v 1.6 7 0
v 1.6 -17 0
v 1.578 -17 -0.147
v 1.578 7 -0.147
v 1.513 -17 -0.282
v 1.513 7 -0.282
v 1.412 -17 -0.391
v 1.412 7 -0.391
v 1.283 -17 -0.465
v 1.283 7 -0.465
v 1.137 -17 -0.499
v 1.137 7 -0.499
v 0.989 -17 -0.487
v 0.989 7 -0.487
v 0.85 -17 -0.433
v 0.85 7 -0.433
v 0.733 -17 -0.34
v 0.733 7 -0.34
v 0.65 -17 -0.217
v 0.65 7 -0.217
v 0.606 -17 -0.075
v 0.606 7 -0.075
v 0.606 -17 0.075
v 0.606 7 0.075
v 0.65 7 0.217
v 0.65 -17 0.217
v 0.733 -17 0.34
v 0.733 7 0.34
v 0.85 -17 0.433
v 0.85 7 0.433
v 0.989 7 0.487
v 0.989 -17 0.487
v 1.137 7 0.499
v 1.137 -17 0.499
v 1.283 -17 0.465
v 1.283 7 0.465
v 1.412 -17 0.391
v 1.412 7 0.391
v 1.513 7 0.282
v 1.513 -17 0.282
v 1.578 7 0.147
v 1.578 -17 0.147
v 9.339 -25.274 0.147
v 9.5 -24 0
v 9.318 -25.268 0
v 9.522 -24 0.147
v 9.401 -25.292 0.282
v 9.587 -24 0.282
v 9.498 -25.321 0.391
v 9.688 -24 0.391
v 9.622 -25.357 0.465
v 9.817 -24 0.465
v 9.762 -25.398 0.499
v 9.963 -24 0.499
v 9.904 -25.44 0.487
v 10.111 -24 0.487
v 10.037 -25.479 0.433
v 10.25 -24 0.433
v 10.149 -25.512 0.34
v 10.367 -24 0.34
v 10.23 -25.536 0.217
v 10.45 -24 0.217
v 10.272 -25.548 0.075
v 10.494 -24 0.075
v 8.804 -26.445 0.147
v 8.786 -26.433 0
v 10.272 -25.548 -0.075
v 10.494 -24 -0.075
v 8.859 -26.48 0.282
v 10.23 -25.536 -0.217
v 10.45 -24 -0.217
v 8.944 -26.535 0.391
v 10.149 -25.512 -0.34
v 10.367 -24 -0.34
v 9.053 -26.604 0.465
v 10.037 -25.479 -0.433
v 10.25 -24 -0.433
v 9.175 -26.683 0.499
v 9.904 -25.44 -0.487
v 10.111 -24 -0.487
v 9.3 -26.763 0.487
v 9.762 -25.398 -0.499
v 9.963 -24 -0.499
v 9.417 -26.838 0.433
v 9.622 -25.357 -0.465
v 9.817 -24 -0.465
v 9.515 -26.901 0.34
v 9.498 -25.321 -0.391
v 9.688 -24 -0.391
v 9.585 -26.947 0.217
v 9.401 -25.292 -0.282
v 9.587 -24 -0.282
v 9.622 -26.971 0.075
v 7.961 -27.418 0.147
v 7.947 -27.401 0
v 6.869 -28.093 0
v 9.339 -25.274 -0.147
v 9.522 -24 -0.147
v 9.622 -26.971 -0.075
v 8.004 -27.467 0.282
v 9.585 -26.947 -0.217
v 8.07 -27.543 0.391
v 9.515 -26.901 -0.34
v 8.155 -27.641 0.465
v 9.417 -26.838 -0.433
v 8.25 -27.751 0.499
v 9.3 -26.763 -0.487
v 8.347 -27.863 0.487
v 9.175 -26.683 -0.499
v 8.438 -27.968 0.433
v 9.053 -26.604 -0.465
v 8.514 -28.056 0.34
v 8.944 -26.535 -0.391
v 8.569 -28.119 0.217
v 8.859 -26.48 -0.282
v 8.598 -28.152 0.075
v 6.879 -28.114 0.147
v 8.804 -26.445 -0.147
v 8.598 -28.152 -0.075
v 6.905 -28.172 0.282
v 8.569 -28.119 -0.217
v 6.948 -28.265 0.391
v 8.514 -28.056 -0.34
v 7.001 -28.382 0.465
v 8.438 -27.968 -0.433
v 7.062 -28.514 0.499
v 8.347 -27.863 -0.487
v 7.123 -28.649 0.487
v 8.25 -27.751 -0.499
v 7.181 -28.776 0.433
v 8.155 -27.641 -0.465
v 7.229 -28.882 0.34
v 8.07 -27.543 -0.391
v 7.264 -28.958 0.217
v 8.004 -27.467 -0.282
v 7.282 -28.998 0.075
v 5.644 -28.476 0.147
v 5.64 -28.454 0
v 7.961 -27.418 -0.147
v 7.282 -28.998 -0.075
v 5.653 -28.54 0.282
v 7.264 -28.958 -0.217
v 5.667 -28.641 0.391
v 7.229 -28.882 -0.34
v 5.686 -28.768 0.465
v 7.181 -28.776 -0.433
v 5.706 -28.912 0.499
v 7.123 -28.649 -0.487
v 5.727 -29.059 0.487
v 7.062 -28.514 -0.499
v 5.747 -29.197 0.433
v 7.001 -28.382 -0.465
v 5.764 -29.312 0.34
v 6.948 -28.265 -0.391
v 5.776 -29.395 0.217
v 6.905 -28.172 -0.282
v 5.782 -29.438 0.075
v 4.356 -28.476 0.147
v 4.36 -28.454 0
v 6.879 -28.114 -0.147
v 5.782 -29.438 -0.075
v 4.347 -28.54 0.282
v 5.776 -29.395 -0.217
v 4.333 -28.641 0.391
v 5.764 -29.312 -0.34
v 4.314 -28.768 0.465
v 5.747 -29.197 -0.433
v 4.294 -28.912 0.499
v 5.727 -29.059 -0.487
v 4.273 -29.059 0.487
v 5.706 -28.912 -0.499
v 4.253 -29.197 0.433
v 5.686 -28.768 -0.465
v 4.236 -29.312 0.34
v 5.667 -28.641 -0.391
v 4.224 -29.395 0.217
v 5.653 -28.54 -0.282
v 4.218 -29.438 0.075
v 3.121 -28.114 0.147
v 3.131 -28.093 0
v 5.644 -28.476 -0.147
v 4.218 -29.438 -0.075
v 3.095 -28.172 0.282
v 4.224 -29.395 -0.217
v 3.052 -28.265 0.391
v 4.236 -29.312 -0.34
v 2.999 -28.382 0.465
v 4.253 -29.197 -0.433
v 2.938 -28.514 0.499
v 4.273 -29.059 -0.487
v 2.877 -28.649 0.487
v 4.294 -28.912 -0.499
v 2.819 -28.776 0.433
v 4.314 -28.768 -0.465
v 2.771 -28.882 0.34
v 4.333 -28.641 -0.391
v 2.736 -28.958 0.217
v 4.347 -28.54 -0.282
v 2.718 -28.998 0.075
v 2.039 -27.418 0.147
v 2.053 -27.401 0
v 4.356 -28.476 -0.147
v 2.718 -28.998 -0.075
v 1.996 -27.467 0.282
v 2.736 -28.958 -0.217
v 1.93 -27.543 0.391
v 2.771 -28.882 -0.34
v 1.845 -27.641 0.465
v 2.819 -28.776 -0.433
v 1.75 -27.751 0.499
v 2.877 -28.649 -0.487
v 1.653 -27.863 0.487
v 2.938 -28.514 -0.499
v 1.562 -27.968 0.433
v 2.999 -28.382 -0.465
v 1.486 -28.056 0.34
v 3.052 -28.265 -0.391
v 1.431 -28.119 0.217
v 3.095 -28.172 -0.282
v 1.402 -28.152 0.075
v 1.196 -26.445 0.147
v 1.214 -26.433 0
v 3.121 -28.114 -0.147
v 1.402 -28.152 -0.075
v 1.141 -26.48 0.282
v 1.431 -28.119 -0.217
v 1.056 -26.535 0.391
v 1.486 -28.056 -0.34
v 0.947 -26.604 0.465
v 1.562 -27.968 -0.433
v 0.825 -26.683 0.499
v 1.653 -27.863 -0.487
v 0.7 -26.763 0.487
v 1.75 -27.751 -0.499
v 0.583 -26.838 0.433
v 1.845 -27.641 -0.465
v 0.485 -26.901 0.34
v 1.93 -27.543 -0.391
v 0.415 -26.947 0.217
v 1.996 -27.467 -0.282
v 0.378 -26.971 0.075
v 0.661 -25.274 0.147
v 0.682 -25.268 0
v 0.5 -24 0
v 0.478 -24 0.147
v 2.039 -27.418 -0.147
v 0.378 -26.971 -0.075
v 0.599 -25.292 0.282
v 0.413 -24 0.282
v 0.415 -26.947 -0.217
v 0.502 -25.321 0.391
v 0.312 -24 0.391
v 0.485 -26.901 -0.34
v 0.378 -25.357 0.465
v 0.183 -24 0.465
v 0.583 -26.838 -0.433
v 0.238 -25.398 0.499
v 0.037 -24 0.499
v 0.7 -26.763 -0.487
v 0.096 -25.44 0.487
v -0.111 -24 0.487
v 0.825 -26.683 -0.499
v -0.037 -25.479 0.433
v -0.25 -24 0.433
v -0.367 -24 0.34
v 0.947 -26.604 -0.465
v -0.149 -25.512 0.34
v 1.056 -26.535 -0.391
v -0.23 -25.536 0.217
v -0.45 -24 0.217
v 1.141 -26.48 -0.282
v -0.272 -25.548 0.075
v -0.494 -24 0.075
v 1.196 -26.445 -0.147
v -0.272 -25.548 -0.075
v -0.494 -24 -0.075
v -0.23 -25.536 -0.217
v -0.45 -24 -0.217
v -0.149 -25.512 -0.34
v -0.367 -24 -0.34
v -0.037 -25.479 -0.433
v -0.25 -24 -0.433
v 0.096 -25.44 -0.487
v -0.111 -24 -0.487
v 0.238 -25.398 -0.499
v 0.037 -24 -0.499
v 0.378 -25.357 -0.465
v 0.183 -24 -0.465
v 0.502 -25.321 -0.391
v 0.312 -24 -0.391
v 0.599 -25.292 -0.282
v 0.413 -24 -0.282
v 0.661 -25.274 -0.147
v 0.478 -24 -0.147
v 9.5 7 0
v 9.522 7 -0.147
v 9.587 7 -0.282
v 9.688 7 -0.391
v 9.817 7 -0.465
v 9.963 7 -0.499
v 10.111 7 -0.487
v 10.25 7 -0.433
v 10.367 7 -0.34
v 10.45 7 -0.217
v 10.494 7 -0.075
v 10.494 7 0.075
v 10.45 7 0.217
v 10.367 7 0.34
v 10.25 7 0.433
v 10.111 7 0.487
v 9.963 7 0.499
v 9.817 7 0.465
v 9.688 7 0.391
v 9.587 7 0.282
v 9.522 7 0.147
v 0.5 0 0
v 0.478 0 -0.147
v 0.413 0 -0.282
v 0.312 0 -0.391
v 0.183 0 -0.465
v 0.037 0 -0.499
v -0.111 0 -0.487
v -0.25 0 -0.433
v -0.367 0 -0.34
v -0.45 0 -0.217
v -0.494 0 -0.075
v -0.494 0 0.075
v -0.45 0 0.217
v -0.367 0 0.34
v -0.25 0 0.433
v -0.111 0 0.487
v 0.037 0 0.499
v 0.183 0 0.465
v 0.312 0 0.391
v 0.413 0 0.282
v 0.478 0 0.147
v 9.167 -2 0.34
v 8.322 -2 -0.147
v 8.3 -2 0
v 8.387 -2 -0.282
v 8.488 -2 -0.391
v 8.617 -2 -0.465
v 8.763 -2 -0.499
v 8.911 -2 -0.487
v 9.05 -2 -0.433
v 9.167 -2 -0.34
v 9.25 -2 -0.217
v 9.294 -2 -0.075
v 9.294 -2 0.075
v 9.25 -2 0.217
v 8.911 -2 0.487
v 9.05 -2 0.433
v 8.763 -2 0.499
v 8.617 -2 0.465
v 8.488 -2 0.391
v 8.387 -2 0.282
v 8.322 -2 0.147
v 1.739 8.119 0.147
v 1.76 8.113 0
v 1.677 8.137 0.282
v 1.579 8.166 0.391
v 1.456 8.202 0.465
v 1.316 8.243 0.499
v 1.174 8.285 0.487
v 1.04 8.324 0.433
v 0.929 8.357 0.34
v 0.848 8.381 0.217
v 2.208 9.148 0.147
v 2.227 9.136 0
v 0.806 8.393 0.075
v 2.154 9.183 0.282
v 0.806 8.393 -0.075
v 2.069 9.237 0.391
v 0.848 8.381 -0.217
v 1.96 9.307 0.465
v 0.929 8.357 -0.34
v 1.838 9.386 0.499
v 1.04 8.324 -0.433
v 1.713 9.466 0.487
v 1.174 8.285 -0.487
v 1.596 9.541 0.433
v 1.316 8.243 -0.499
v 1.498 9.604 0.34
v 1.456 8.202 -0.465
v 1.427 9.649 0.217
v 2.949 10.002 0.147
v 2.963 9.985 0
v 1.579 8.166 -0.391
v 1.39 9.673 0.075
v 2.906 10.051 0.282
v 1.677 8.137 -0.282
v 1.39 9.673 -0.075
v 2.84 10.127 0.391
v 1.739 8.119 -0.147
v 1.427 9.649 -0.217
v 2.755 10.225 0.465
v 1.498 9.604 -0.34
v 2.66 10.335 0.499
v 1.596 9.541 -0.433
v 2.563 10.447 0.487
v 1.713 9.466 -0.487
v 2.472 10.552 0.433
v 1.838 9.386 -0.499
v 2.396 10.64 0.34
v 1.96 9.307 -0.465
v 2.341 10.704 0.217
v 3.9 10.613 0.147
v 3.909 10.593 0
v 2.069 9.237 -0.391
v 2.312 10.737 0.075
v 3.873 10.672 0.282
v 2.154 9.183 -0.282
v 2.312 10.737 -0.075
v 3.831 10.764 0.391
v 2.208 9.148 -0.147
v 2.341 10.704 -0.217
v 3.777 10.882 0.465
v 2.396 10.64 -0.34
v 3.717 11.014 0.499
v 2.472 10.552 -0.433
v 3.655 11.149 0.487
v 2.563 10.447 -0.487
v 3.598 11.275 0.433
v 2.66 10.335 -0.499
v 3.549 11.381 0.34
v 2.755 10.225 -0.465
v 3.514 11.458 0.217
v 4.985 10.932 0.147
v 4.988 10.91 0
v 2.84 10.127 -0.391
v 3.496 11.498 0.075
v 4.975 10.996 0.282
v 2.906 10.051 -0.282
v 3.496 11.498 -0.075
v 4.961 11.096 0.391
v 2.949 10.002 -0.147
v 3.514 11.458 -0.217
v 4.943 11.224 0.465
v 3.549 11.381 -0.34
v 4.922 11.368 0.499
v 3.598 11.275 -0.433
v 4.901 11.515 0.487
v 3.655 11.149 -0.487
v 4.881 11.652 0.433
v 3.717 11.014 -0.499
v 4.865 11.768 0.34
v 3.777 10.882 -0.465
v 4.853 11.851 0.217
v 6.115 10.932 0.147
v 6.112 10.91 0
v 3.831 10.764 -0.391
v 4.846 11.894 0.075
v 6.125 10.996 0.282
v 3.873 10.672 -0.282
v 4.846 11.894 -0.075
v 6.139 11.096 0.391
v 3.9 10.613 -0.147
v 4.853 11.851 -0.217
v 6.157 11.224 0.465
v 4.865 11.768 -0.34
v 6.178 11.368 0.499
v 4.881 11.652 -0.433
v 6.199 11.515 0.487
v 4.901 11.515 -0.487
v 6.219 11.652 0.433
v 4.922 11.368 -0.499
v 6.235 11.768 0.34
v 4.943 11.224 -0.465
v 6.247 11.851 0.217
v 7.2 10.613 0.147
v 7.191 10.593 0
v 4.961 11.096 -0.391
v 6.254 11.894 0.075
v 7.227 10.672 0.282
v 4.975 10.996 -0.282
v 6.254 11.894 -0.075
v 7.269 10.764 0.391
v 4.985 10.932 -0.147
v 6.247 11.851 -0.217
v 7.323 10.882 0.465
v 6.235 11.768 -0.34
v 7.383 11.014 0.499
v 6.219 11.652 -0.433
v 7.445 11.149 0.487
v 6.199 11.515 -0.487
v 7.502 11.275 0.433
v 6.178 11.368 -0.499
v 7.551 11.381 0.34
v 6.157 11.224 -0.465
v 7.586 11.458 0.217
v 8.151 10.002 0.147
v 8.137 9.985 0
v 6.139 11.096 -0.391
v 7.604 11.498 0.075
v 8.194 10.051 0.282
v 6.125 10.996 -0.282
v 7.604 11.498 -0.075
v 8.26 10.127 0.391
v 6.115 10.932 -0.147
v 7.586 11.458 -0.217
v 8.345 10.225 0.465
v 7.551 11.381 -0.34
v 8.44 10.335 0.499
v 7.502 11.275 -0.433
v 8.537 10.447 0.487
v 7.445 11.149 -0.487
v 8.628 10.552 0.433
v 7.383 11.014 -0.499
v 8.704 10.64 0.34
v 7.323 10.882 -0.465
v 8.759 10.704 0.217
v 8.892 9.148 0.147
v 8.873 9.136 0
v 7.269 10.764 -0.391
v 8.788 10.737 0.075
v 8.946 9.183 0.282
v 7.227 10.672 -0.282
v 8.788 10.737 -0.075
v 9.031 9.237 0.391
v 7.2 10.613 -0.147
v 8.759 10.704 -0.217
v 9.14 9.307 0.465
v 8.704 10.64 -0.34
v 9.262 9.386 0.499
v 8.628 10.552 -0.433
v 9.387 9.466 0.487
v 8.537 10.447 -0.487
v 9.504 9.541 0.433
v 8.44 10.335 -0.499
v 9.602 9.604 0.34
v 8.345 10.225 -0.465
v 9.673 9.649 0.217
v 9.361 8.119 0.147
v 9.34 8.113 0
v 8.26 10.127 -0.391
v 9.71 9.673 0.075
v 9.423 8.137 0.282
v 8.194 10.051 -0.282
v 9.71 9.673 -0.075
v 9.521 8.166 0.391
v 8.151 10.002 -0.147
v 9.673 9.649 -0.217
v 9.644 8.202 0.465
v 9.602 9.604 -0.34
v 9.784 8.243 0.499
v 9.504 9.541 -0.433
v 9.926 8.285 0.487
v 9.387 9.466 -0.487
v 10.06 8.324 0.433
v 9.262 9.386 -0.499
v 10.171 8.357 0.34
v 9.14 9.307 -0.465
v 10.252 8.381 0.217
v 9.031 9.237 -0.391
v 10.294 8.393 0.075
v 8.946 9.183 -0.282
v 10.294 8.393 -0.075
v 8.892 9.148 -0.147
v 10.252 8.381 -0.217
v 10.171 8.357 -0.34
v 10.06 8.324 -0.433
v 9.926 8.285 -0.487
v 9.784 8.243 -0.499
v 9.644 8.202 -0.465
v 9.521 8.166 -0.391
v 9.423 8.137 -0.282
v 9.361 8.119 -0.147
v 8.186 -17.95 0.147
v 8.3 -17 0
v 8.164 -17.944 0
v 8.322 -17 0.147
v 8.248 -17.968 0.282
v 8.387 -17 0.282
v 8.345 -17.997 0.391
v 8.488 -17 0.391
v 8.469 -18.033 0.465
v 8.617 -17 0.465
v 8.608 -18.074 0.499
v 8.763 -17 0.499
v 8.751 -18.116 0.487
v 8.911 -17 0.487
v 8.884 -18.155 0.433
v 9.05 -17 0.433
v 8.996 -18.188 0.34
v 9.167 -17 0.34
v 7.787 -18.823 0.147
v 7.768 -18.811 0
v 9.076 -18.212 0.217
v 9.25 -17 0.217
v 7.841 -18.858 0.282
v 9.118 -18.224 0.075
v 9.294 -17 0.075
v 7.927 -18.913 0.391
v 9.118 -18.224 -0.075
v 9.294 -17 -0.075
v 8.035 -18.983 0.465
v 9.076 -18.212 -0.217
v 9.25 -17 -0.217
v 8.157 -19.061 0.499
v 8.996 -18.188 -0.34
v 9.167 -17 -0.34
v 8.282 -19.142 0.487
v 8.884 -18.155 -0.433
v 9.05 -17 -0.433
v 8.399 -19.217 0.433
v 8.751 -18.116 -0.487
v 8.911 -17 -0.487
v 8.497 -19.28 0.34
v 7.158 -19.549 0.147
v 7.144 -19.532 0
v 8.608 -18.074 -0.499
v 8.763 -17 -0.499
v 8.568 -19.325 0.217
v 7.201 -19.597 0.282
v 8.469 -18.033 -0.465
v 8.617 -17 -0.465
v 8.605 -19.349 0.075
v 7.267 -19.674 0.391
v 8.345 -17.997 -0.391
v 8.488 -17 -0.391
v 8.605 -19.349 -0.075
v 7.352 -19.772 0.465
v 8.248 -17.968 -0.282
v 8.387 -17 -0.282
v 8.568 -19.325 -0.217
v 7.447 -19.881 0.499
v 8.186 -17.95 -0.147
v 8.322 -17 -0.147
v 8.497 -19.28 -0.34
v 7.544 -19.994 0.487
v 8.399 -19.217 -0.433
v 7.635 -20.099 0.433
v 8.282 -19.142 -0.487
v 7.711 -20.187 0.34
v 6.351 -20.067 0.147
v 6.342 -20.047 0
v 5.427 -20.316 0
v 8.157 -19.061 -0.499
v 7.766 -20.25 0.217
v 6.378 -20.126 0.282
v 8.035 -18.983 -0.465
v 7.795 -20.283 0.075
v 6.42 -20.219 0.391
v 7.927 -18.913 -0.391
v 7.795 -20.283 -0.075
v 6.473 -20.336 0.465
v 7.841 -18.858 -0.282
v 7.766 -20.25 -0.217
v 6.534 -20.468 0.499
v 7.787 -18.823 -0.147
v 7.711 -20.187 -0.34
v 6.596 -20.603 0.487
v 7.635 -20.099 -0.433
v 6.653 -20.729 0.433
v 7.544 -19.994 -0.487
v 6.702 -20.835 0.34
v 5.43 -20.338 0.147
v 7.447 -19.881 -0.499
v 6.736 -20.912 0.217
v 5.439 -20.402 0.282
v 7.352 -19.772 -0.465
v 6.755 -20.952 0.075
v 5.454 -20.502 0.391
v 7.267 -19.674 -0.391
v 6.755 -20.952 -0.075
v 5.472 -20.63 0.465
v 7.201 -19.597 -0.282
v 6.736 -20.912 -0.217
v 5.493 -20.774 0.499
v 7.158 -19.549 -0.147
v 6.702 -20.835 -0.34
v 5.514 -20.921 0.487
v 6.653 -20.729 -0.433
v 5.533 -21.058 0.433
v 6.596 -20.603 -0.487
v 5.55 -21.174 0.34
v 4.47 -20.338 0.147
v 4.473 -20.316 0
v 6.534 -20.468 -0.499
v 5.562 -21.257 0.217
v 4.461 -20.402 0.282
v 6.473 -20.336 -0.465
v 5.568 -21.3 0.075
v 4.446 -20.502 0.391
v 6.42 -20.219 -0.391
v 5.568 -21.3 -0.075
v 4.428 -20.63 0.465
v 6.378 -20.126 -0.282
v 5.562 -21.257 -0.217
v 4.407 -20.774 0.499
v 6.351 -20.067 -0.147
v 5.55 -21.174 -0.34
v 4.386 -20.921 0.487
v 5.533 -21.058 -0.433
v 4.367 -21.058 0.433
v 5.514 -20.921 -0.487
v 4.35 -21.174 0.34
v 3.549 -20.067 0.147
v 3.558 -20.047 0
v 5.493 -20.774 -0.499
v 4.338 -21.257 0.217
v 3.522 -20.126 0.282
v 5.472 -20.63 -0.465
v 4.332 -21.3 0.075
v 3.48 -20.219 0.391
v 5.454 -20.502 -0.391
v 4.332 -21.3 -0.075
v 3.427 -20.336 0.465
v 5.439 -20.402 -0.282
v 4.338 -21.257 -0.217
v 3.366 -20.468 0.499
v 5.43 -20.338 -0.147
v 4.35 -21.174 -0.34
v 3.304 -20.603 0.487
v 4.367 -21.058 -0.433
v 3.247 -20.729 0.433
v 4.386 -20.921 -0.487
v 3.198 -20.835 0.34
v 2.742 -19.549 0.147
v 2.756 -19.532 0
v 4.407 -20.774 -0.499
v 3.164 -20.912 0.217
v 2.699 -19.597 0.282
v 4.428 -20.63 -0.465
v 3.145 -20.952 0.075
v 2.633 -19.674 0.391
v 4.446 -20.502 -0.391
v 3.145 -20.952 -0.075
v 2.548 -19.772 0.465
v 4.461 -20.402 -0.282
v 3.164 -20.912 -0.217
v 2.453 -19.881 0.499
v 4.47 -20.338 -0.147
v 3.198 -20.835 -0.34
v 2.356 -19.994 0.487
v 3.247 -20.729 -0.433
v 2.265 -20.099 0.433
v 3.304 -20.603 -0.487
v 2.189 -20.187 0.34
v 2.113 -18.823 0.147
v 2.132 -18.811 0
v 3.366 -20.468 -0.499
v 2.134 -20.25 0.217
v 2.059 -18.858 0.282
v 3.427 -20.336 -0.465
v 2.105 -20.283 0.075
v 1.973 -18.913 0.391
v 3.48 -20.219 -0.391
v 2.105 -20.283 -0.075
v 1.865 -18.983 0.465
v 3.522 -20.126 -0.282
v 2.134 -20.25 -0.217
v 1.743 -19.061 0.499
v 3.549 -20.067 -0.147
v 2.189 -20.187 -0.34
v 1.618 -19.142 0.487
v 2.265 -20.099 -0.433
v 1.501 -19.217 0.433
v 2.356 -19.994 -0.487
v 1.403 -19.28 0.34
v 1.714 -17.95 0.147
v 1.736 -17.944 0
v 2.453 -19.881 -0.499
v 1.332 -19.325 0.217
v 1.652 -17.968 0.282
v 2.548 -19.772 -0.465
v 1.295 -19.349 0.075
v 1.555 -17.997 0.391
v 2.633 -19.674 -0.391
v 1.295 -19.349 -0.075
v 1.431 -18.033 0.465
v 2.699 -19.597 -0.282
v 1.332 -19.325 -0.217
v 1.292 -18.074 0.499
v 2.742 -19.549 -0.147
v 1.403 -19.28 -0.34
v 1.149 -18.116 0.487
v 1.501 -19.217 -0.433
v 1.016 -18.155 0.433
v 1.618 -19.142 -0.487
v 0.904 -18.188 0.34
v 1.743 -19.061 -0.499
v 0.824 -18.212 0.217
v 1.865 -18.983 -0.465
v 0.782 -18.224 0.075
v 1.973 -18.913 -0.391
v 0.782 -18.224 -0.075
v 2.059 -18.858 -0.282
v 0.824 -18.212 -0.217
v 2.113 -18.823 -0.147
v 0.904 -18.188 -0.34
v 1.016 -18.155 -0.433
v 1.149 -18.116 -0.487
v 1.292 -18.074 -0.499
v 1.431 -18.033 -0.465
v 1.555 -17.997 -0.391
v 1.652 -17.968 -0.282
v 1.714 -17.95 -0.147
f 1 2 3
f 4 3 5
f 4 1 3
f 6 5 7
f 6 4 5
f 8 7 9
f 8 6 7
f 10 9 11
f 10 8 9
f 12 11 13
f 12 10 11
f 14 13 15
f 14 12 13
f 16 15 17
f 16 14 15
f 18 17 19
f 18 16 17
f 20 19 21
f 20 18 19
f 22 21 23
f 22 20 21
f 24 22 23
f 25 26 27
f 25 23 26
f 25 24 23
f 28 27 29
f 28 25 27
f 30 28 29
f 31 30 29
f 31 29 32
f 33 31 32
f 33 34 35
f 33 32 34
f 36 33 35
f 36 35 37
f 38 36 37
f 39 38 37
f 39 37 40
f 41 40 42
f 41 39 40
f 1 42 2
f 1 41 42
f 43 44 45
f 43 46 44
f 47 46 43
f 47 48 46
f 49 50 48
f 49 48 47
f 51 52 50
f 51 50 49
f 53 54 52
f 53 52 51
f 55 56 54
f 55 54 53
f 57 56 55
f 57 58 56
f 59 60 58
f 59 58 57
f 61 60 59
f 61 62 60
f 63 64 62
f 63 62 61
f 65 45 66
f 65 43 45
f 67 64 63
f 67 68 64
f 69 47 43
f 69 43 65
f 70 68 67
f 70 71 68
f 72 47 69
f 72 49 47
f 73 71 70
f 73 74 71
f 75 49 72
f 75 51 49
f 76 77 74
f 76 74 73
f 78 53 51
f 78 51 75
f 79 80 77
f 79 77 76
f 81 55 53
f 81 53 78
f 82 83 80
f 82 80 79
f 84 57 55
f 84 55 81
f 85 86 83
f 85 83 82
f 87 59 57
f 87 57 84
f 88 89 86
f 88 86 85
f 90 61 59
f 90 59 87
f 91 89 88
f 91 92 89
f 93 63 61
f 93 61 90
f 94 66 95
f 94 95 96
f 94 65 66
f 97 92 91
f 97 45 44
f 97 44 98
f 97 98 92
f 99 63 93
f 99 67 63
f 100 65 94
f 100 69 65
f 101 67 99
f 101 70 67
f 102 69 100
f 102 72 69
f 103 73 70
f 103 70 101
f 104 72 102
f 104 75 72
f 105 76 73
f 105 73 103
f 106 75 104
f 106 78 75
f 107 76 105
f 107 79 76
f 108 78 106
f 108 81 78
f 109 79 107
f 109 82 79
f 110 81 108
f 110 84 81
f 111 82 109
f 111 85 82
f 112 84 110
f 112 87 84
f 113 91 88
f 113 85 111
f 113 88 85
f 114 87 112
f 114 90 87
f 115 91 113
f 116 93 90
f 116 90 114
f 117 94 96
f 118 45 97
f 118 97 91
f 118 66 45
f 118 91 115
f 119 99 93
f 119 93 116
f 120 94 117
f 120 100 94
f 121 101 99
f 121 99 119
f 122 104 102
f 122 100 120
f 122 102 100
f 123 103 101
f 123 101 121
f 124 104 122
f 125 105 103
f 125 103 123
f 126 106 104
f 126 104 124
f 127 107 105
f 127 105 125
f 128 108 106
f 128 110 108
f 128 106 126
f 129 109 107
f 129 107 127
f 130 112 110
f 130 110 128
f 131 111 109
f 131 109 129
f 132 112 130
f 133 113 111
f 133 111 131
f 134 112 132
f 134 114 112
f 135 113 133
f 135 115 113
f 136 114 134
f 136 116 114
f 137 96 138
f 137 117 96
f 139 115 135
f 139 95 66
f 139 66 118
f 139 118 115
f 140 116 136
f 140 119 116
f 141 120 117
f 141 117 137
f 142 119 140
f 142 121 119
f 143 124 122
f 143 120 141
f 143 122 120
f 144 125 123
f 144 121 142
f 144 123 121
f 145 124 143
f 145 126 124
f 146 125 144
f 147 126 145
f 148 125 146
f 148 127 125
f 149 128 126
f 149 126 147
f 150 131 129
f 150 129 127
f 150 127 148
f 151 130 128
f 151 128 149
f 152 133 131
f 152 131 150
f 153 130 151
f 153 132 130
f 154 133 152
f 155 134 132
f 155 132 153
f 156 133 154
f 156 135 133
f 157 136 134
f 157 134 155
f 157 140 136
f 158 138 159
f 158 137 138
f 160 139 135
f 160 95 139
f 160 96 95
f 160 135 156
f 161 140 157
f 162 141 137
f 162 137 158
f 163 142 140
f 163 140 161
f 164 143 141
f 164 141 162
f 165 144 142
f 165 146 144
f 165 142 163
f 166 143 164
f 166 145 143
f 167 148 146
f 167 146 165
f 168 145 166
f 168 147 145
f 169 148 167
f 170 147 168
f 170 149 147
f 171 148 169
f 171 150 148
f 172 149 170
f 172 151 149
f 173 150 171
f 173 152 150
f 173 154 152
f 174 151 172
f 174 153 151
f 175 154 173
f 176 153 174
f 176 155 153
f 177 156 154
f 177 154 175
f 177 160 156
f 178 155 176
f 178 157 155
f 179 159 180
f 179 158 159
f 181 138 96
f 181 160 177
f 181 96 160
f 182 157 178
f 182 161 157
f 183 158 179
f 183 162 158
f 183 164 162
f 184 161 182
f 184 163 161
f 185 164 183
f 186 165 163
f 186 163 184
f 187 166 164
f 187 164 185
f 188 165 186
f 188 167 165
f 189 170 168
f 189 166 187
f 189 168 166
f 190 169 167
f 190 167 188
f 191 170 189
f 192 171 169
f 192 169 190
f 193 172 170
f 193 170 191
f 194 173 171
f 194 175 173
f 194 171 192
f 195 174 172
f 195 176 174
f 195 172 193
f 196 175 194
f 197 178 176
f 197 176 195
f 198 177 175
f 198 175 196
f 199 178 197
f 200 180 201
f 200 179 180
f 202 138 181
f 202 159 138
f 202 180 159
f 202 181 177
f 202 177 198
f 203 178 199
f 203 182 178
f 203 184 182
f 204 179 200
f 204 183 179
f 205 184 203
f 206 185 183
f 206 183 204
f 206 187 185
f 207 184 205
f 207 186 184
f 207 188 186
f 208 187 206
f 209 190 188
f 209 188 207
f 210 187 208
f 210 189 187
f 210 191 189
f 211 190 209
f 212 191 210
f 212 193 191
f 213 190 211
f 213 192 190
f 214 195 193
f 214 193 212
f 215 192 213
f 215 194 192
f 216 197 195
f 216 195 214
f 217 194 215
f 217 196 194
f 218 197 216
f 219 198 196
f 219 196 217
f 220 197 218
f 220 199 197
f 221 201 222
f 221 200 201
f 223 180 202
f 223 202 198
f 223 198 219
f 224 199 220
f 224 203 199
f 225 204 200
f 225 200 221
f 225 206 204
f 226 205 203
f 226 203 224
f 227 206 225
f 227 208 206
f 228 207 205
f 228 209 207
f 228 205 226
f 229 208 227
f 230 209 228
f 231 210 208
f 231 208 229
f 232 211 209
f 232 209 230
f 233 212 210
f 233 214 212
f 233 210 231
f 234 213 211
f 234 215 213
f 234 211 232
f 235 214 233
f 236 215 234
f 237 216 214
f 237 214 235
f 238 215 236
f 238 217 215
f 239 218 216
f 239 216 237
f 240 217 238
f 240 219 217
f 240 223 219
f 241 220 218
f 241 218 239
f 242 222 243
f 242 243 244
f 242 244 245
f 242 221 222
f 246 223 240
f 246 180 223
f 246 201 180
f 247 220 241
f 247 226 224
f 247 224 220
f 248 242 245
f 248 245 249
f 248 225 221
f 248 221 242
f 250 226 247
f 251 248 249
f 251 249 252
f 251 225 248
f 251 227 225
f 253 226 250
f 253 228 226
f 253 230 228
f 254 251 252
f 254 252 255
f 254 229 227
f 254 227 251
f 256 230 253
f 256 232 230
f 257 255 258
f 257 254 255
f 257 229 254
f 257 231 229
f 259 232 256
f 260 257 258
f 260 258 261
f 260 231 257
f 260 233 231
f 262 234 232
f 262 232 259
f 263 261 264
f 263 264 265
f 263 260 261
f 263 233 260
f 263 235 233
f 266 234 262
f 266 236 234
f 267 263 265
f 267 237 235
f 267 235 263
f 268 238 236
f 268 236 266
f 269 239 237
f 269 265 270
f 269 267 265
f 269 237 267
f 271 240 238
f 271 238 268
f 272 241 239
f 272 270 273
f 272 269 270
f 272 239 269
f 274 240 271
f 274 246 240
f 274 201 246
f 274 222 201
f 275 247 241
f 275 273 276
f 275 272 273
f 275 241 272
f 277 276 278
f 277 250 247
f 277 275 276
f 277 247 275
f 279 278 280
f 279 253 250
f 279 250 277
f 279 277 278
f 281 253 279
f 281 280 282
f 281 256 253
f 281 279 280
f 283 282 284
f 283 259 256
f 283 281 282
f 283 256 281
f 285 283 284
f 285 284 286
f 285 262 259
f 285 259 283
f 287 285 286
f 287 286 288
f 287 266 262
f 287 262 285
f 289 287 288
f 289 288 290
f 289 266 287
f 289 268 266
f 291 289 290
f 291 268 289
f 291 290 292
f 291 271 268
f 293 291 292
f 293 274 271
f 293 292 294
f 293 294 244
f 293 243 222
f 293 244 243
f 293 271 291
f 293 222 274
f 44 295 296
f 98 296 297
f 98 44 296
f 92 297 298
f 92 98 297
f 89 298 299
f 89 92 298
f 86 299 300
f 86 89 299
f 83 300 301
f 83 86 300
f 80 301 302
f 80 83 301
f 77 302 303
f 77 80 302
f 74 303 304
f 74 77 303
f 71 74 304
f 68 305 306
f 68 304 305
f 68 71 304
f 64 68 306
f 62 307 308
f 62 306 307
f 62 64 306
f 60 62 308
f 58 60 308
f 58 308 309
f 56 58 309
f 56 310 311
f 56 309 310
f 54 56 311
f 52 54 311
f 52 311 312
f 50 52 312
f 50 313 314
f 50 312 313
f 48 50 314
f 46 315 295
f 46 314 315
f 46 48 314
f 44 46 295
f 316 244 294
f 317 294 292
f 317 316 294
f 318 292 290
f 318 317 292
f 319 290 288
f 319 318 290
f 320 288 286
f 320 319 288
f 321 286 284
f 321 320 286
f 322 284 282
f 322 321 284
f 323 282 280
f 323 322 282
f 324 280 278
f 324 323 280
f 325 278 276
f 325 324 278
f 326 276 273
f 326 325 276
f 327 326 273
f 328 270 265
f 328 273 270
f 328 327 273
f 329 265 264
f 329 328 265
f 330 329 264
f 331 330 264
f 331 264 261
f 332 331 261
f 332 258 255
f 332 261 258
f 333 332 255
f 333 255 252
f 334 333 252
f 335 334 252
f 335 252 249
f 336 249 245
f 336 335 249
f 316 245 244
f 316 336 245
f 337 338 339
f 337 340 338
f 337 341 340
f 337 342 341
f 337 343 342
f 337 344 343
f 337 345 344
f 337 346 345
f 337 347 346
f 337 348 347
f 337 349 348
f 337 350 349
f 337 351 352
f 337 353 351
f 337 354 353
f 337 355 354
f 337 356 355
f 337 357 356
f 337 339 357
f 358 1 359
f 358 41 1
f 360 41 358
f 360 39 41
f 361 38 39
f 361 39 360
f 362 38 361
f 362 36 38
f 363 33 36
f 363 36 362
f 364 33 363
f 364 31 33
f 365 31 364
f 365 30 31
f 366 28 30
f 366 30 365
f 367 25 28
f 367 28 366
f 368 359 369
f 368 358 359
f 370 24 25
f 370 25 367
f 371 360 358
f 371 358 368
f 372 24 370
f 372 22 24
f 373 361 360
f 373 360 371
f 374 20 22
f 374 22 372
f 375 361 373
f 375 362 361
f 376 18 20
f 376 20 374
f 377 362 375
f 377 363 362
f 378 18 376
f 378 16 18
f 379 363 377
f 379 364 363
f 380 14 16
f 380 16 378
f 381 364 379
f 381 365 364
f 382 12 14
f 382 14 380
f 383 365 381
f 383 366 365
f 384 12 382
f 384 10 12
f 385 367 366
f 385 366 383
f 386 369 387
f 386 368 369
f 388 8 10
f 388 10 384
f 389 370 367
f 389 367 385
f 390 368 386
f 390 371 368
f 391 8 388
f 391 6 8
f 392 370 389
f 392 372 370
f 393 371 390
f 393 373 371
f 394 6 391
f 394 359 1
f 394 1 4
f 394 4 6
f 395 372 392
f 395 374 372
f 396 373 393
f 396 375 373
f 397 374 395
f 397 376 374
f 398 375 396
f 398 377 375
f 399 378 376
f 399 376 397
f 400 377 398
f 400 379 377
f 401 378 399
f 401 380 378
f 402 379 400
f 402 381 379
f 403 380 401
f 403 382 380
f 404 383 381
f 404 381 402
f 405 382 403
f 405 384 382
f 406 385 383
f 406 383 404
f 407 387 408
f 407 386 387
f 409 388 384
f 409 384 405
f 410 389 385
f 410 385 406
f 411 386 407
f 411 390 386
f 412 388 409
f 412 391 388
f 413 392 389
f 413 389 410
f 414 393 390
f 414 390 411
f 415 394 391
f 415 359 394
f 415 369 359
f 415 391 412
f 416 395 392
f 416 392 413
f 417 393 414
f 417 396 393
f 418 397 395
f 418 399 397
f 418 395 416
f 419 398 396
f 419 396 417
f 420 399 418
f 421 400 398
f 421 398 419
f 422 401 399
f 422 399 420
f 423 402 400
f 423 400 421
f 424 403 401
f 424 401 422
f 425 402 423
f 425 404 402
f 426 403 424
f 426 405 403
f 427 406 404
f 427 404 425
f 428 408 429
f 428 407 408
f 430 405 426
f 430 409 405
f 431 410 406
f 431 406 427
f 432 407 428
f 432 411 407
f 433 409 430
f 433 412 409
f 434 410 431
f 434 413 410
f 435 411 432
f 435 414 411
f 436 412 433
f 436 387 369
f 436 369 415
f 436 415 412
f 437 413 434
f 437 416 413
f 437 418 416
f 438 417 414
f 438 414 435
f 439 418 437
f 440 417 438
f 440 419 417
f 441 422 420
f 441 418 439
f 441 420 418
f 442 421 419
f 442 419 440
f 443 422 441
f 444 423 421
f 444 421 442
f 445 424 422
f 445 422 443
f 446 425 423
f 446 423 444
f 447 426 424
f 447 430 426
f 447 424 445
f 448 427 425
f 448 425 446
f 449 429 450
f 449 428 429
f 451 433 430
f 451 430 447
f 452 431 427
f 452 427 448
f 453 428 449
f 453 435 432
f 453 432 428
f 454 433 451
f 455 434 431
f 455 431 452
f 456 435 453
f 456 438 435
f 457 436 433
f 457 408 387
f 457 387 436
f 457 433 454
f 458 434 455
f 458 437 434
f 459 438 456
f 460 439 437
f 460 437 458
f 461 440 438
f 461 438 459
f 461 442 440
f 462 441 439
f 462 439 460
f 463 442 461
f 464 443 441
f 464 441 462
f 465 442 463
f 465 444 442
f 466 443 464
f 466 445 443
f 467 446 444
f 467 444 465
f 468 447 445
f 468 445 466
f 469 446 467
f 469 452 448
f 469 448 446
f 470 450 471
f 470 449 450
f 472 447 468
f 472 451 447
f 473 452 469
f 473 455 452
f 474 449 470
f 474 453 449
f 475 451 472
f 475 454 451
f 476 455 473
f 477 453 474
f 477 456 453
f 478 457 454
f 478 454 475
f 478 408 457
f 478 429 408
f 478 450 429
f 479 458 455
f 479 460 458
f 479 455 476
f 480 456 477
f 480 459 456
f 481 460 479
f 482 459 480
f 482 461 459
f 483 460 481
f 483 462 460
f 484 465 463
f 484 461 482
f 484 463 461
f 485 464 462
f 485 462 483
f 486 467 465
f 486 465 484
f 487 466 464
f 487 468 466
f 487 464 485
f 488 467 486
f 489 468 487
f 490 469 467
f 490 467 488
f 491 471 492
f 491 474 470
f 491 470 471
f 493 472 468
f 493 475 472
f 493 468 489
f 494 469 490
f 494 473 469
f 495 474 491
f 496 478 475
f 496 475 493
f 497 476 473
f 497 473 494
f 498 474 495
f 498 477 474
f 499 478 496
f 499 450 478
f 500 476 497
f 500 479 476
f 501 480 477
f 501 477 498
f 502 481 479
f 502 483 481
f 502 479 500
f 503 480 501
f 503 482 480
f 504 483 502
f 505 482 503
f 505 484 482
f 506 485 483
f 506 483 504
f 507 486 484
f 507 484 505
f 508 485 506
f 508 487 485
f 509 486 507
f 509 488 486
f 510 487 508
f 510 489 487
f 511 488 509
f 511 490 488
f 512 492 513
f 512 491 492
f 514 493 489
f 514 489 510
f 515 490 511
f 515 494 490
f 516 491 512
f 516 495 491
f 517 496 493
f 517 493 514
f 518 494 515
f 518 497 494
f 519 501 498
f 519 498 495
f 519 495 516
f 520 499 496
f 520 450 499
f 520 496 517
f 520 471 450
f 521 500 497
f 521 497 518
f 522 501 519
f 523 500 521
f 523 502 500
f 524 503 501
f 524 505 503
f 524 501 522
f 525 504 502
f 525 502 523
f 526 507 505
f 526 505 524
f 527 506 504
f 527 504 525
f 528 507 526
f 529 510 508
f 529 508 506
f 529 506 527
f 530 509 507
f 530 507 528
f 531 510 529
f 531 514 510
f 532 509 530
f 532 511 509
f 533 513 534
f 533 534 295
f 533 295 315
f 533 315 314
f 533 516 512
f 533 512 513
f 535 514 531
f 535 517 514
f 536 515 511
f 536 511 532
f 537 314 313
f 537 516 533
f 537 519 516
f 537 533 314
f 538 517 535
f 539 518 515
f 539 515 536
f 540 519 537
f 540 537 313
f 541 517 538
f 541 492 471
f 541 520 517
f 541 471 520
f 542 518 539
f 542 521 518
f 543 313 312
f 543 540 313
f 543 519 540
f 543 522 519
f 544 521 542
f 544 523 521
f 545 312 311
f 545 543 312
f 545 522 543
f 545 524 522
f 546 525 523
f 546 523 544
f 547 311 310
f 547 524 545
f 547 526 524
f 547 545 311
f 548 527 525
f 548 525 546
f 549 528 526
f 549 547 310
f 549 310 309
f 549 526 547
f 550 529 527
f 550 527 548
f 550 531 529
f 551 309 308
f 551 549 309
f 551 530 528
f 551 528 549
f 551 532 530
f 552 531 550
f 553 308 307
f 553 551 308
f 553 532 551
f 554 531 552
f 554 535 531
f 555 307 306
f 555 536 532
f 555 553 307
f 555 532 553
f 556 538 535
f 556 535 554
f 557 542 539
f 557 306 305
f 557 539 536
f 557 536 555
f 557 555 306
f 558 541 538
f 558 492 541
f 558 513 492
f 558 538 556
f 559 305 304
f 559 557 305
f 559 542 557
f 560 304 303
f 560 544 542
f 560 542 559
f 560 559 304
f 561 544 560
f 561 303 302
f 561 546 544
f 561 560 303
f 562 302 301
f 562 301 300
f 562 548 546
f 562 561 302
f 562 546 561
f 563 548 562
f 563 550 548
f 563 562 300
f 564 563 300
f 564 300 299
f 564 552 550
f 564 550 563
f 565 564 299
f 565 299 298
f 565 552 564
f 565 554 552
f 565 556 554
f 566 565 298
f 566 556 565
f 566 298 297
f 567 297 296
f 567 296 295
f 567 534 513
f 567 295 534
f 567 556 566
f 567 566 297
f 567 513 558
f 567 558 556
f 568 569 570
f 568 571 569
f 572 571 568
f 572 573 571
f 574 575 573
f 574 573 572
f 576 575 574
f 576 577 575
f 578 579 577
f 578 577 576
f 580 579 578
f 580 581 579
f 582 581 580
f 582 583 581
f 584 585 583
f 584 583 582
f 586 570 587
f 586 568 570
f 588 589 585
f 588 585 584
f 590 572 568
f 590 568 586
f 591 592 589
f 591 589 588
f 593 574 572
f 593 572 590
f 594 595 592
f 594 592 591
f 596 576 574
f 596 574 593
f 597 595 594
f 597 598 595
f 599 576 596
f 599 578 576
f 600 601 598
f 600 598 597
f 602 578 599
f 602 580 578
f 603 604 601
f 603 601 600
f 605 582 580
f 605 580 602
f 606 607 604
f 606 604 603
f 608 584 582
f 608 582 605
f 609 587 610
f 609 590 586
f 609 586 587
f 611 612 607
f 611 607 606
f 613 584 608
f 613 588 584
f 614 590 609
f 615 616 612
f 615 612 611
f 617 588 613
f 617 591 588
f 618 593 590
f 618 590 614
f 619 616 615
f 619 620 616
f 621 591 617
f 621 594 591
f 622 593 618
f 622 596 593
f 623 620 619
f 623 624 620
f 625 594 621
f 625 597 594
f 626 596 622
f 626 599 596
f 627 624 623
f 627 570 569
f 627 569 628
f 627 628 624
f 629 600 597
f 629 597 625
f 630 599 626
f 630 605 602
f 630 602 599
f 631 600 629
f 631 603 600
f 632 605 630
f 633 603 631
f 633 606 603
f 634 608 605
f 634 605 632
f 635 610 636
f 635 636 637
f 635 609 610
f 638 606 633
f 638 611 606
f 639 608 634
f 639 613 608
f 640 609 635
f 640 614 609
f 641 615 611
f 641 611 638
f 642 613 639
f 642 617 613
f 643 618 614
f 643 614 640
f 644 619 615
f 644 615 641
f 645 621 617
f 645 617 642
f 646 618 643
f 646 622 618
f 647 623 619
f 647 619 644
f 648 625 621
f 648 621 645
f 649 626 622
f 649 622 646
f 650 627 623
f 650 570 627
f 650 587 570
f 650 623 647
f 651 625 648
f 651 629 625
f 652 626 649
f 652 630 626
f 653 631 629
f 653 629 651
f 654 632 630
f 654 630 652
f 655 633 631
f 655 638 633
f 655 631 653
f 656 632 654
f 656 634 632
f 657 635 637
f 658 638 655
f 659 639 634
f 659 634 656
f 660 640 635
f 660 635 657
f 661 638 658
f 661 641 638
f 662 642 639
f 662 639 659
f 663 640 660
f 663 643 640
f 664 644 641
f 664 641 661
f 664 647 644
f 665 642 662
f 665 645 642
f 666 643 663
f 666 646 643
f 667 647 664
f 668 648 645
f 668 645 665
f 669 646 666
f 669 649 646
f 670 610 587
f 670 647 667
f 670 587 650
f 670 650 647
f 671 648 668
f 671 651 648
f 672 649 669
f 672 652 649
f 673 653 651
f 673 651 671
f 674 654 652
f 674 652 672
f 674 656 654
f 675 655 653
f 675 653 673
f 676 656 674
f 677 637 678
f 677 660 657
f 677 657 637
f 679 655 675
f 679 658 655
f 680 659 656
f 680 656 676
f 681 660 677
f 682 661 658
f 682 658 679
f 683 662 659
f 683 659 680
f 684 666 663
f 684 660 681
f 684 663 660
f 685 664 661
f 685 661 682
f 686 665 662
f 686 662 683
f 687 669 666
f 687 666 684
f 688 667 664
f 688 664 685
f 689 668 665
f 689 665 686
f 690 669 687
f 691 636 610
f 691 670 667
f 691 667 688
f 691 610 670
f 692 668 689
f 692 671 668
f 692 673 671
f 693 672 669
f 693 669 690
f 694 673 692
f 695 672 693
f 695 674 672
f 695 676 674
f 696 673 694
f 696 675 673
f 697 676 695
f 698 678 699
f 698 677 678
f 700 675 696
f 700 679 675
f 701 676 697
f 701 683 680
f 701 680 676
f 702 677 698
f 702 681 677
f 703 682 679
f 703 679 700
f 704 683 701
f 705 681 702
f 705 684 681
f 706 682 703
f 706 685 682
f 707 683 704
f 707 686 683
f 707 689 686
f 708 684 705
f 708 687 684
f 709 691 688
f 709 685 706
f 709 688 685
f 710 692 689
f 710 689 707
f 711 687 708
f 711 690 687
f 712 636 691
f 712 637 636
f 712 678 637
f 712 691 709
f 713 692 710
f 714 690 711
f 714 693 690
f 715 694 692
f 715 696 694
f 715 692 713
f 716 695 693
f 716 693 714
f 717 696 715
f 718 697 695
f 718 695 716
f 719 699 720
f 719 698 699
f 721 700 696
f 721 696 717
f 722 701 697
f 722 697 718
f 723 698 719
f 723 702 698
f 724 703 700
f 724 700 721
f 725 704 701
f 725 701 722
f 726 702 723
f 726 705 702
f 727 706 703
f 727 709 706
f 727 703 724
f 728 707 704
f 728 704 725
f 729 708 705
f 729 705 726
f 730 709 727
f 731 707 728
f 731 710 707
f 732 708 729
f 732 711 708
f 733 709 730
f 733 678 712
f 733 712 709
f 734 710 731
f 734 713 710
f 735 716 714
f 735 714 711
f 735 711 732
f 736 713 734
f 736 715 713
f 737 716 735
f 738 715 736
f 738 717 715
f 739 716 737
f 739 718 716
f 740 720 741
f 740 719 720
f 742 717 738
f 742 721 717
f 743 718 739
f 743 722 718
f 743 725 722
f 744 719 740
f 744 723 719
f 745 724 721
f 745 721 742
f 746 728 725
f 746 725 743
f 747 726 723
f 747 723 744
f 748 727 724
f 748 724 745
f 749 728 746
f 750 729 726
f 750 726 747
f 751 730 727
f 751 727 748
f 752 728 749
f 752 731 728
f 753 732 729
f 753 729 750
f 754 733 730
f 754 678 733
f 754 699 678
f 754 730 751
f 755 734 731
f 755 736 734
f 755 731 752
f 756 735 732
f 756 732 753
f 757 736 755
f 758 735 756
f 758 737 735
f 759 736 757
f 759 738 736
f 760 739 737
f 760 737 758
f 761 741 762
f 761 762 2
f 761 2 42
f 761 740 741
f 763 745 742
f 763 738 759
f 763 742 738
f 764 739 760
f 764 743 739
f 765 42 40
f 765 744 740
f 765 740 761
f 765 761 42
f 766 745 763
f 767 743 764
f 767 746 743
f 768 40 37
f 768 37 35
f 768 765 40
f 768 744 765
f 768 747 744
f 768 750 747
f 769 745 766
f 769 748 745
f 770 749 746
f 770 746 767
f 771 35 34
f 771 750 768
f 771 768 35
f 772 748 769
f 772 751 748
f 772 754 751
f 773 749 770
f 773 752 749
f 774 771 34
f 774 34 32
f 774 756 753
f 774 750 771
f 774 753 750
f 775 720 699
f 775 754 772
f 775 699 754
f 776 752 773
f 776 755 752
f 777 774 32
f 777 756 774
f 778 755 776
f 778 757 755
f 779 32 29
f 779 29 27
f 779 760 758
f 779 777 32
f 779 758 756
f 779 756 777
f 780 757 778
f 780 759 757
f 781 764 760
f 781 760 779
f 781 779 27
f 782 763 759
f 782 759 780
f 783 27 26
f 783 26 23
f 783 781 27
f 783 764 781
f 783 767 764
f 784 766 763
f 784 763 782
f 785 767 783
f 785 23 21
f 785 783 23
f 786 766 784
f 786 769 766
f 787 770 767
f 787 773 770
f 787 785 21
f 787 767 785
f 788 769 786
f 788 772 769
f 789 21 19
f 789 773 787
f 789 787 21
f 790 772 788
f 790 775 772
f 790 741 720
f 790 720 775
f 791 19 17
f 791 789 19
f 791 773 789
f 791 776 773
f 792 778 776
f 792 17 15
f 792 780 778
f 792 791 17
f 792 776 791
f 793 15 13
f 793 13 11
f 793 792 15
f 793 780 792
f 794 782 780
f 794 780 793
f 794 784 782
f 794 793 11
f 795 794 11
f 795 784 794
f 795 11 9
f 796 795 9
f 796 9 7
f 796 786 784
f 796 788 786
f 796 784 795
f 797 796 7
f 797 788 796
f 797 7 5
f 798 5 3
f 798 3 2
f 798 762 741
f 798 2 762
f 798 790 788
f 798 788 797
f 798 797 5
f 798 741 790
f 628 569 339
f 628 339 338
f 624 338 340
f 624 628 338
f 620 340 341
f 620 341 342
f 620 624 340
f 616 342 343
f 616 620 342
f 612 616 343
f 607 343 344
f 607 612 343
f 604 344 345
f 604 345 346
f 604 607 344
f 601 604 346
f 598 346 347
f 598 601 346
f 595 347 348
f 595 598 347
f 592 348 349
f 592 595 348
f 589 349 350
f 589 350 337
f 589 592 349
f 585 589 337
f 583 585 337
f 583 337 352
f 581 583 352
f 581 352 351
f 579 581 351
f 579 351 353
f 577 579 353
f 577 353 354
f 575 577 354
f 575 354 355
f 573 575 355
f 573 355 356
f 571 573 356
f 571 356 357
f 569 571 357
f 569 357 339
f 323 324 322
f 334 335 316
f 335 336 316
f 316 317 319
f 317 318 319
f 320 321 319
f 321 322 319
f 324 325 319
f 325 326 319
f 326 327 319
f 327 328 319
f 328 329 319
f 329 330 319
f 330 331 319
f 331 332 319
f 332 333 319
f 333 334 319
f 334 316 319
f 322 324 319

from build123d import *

# Parameters (mm, degrees)
F1_R = 0.5


with BuildPart() as f2:
    # F2: sweep along a path in F0
    with BuildLine(Plane.XY) as f2_path:
        Line((8.8, -2), (8.8, -17))
        ThreePointArc((8.8, -17), (4.95, -20.85), (1.1, -17))
        Line((1.1, -17), (1.1, 7))
        ThreePointArc((1.1, 7), (5.55, 11.45), (10, 7))
        Line((10, 7), (10, -24))
        ThreePointArc((10, -24), (5, -29), (0, -24))
        Line((0, -24), (0, 0))
    # F1 (on Front) → F2 (sweep)
    with BuildSketch(Plane.XZ):
        Circle(F1_R)
    sweep(path=f2_path.line)


solid = f2.part
